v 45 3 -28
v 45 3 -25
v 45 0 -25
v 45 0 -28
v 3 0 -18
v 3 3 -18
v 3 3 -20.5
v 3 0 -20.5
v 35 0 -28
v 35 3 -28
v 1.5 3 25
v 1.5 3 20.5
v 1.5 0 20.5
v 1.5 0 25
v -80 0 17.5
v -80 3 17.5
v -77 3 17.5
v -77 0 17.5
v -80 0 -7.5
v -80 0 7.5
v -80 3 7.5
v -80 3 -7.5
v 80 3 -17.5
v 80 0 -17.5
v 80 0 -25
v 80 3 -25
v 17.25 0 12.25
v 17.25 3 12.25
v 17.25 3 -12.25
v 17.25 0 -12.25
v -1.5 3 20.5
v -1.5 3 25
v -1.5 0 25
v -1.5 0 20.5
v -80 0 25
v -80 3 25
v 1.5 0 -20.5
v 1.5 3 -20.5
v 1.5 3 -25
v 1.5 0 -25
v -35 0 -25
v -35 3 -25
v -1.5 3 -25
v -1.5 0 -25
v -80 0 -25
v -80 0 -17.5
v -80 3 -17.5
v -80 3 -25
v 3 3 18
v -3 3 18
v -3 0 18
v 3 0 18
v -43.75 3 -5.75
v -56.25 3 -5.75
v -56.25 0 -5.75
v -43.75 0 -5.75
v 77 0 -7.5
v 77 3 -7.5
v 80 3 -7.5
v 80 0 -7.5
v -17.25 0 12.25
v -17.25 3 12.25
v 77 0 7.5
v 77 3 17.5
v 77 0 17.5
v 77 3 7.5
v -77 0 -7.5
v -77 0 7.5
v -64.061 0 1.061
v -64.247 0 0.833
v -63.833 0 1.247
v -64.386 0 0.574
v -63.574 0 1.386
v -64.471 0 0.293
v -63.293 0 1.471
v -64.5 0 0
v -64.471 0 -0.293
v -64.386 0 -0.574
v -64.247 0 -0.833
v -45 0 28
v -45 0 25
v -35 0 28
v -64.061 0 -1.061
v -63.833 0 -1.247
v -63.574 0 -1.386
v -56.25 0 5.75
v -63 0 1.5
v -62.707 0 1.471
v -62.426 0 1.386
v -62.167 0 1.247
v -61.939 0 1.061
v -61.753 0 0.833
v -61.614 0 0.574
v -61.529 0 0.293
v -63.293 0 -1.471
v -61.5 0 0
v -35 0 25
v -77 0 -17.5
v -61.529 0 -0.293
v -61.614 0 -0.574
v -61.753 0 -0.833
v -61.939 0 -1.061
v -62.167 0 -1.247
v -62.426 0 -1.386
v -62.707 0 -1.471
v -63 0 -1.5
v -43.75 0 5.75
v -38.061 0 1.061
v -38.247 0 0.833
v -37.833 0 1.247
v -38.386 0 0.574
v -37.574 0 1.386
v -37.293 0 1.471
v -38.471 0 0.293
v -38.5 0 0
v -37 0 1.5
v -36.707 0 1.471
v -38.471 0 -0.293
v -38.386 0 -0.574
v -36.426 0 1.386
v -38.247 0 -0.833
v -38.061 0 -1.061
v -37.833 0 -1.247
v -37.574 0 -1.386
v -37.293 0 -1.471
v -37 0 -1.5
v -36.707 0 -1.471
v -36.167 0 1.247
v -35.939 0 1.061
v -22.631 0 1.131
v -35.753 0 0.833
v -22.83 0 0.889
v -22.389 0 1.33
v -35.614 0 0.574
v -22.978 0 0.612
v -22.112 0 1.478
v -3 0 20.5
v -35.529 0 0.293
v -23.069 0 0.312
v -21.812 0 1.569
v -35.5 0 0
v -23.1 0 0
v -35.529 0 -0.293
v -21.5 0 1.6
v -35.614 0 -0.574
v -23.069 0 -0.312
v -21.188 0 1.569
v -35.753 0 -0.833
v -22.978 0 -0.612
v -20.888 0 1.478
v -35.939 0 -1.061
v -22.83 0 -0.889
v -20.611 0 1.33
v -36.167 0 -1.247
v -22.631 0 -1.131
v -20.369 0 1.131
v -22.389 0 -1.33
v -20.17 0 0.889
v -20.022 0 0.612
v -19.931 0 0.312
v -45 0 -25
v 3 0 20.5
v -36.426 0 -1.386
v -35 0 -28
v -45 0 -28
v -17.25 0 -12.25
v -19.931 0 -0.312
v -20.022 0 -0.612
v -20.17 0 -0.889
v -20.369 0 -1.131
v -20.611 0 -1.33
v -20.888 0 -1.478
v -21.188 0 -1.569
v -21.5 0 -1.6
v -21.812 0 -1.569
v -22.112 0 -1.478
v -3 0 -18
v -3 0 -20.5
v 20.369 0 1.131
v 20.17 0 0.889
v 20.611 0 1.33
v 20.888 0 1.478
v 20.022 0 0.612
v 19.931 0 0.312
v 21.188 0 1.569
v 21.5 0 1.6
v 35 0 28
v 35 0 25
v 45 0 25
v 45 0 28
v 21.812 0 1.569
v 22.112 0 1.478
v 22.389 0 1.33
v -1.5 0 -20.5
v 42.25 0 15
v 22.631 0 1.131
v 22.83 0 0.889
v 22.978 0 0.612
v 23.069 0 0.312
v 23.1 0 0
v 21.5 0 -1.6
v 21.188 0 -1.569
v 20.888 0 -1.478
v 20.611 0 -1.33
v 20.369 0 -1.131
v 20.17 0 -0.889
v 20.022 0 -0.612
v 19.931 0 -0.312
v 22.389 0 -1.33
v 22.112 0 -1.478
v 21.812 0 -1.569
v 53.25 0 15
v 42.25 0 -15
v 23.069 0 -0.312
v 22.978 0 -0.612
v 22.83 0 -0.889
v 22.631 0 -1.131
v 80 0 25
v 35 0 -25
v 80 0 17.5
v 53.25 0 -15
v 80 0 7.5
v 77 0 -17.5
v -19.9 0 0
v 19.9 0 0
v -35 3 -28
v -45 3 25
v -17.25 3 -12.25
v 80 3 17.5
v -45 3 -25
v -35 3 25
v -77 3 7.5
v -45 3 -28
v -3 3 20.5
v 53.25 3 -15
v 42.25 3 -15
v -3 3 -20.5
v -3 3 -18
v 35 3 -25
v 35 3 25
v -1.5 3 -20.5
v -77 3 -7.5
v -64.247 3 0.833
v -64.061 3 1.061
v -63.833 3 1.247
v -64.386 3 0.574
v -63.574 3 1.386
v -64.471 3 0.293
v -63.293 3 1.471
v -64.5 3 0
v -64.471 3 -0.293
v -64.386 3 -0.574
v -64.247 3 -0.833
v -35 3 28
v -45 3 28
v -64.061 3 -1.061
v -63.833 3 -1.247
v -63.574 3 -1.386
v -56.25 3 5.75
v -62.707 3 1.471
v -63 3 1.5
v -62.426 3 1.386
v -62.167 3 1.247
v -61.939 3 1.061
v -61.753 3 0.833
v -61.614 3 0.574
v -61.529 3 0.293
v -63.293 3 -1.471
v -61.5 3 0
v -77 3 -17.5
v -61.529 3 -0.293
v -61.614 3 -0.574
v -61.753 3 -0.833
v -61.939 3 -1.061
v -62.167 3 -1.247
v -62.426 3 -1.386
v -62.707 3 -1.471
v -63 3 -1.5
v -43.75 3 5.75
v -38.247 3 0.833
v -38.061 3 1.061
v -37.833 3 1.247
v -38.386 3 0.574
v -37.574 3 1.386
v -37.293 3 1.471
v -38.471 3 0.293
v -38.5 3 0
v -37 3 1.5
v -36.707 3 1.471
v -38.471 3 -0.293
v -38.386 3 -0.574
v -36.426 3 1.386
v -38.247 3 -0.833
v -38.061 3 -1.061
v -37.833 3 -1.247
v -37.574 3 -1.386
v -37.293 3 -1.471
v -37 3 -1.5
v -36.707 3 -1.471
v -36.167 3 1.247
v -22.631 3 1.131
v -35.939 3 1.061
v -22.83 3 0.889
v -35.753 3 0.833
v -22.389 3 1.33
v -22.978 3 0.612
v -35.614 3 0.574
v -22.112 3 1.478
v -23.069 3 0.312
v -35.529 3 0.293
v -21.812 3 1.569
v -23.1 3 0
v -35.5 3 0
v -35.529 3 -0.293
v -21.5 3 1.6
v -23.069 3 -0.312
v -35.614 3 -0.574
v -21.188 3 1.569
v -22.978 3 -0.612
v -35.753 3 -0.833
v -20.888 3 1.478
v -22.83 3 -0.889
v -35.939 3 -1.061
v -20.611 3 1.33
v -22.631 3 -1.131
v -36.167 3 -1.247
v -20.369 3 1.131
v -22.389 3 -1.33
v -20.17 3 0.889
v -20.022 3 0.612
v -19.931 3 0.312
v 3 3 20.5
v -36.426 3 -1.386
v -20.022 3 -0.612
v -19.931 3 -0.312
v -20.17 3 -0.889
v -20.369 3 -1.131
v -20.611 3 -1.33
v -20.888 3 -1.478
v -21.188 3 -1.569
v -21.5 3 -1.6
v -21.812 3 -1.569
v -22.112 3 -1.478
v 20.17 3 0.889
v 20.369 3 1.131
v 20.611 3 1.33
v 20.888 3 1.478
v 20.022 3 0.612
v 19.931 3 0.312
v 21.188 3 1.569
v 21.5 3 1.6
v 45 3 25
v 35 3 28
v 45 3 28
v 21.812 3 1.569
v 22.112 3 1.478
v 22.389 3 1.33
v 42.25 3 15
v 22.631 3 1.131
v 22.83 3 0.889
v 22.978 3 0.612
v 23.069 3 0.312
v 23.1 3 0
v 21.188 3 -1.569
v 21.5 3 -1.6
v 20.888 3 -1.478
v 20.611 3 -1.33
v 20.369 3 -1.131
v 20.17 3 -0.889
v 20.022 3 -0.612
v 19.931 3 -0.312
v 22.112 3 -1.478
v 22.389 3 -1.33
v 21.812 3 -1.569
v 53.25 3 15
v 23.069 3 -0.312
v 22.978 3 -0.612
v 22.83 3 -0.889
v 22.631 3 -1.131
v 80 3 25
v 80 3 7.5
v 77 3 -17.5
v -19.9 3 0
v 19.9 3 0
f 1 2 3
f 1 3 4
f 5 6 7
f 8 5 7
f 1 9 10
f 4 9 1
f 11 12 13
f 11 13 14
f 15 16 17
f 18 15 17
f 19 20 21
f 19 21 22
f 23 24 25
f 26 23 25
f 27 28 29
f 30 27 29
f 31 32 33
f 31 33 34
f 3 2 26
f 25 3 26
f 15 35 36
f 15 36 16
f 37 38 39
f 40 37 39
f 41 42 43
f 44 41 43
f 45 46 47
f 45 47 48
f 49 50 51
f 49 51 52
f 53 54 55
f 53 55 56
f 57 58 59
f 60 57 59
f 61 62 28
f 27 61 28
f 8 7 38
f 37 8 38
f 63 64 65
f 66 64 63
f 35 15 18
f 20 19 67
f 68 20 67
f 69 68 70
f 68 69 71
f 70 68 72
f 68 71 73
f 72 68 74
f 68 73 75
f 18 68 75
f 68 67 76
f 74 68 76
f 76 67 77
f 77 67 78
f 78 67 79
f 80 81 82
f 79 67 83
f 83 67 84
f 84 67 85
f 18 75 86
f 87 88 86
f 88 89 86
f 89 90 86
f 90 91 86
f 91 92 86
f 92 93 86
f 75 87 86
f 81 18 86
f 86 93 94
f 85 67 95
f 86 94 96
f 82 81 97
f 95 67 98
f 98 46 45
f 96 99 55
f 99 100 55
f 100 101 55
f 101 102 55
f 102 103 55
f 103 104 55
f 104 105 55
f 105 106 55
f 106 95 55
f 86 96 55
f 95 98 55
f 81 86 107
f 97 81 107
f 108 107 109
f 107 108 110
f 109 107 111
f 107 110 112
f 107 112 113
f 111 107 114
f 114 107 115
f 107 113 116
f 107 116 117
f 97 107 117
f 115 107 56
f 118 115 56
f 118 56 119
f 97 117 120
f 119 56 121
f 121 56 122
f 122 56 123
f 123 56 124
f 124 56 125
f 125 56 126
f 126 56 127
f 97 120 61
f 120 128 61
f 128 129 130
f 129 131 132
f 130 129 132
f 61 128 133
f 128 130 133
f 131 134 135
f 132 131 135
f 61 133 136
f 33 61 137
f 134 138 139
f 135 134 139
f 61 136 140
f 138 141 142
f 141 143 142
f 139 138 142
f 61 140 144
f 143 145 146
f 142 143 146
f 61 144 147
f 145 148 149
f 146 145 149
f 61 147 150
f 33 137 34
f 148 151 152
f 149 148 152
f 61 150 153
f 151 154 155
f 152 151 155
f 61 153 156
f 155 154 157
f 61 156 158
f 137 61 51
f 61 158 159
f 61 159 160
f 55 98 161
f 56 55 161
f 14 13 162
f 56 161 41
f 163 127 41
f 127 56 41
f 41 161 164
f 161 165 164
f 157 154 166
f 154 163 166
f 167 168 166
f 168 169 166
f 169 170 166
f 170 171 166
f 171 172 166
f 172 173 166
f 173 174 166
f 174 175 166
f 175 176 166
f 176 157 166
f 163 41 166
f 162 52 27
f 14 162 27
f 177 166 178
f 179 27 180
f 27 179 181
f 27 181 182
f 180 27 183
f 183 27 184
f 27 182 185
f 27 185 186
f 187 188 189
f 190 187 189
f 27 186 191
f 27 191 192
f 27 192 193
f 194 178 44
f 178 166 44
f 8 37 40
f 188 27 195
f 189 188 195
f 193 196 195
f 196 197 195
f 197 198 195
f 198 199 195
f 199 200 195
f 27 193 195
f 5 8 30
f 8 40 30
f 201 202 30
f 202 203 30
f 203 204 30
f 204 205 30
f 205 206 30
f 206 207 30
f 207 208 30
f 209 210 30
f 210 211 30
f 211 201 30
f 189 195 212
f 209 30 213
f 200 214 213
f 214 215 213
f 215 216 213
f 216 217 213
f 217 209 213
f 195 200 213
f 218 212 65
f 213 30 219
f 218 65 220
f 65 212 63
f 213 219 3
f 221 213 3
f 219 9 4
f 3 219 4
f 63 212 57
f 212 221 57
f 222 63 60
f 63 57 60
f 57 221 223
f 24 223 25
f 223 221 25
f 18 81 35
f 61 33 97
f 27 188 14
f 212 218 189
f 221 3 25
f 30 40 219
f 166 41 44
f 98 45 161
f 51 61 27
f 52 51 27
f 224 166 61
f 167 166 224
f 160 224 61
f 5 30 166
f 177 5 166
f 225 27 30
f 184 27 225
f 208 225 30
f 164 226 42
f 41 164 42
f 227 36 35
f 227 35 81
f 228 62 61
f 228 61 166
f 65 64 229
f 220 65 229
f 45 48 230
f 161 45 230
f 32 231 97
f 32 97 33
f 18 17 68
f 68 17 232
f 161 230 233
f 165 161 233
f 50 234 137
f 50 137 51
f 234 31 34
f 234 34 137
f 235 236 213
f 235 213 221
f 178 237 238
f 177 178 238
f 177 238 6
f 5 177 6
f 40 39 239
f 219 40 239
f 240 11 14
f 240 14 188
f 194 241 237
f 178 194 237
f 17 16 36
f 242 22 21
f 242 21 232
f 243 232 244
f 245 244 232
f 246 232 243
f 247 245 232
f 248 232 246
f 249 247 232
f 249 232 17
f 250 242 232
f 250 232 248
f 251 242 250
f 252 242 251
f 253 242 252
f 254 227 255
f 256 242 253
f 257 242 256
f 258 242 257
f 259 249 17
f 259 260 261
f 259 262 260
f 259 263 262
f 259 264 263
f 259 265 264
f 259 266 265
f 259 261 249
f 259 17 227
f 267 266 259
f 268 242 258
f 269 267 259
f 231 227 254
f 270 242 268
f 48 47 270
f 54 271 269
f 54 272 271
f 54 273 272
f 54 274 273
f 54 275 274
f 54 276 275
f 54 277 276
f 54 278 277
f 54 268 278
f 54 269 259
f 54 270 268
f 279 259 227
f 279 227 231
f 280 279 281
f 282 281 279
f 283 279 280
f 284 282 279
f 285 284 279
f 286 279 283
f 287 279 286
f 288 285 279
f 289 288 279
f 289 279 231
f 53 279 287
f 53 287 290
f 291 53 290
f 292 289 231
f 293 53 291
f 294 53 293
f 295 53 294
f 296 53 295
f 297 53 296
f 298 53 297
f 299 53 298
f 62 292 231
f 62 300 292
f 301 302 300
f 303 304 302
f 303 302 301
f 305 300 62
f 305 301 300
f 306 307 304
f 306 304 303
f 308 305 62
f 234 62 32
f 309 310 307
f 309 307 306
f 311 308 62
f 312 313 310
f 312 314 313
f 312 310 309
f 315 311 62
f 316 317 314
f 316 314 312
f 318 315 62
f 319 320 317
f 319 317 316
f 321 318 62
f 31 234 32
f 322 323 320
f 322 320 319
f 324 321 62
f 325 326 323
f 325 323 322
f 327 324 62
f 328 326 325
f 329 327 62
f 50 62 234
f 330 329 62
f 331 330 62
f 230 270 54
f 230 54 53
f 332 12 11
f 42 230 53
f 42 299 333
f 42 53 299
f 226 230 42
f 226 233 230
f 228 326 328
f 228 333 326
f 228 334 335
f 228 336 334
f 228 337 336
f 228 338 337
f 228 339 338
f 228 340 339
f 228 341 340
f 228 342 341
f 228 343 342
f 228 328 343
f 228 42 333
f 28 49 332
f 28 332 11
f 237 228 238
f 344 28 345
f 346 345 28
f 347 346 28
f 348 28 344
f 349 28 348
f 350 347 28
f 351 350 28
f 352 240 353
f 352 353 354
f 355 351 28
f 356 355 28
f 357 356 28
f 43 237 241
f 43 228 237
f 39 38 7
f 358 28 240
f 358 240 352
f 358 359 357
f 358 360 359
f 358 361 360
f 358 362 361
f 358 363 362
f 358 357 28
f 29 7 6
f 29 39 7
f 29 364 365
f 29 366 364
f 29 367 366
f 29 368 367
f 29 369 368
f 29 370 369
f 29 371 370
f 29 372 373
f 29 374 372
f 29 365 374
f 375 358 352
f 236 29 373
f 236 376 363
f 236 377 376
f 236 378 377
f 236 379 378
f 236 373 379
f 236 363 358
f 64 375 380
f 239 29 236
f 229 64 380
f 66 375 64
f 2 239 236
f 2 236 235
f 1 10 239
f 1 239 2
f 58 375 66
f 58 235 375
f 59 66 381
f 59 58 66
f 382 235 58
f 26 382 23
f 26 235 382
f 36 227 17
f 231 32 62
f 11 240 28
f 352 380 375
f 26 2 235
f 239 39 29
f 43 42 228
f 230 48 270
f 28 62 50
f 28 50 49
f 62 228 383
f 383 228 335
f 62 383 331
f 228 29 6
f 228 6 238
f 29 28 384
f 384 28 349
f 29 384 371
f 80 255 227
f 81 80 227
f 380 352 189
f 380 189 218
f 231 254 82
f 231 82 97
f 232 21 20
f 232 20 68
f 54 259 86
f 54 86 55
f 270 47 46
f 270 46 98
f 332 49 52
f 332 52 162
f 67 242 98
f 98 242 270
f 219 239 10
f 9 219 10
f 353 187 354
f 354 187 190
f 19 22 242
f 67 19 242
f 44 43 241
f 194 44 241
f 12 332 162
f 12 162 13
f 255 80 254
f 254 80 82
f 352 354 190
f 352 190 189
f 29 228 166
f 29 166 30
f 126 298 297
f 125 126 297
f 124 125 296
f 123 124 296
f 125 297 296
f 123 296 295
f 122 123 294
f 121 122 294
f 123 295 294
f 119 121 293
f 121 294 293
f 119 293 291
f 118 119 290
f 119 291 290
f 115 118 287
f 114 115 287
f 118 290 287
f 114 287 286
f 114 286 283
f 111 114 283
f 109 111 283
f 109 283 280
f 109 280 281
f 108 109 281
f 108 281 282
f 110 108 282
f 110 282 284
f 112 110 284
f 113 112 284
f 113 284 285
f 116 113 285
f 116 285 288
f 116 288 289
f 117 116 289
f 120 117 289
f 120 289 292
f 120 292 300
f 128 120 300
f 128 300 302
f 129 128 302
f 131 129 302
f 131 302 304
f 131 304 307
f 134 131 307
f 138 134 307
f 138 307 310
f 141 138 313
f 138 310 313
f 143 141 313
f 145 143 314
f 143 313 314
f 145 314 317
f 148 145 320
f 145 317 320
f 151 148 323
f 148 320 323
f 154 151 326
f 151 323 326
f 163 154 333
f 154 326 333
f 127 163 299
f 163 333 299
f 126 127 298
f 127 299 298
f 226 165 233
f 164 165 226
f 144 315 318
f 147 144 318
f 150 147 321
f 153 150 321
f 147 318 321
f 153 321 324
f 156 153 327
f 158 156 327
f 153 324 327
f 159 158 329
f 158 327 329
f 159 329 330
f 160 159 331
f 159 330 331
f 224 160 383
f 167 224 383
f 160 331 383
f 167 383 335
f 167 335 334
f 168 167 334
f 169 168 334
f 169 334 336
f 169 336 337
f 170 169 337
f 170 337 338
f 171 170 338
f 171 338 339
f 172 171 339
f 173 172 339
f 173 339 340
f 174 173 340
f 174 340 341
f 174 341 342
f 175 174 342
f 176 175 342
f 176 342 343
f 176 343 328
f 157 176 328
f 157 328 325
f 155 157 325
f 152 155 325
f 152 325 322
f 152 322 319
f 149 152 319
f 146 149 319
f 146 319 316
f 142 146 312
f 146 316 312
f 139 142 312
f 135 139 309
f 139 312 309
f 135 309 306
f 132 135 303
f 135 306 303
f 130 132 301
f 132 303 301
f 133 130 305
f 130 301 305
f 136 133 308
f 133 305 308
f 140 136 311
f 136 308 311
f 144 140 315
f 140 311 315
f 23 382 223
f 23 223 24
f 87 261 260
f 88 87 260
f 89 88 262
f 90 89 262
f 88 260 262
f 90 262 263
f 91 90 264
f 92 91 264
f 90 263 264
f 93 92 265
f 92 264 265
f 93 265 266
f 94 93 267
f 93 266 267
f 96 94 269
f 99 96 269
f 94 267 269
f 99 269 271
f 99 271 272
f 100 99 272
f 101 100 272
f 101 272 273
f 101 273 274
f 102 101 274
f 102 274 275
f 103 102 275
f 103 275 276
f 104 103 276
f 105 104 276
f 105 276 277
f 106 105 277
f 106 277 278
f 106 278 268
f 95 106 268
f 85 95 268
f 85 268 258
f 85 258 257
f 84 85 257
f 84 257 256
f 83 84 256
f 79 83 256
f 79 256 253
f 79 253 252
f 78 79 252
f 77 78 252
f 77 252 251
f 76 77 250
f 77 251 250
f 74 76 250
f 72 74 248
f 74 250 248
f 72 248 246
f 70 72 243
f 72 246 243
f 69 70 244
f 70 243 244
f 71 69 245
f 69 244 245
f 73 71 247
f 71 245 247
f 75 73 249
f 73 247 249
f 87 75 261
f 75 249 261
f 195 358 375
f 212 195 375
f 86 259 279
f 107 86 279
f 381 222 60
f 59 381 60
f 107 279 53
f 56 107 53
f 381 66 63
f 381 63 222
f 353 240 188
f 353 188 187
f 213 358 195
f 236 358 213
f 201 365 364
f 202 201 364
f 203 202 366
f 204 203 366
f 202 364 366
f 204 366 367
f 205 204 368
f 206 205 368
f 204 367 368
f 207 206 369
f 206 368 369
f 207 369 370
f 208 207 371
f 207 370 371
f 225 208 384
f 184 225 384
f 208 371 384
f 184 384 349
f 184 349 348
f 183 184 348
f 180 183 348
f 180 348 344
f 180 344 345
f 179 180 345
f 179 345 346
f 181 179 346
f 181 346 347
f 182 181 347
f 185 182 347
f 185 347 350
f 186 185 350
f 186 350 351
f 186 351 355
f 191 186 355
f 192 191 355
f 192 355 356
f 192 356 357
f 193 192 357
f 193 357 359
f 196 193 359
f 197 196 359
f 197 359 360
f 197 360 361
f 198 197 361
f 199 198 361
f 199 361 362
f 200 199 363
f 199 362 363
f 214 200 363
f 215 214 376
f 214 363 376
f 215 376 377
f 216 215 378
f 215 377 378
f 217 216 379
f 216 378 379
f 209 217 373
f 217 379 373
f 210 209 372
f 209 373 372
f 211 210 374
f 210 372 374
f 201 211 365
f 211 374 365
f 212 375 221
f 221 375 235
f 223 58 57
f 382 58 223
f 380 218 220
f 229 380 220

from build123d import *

# Parameters (mm, degrees)
SKETCH3_W           = 160
SKETCH3_H           = 56
BOSS_EXTRUDE1_DEPTH = 3
SKETCH4_W           = 3
SKETCH4_H           = 10
SKETCH4_W_2         = 35
SKETCH4_H_2         = 3
CUT_EXTRUDE1_DEPTH  = 85.811555816
SKETCH5_R           = 1.6
SKETCH5_R_2         = 1.5
SKETCH5_W           = 34.5
SKETCH5_H           = 24.5
SKETCH5_W_2         = 11
SKETCH5_H_2         = 30
SKETCH5_W_3         = 12.5
SKETCH5_H_3         = 11.5
CUT_EXTRUDE2_DEPTH  = 85.811555816


with BuildPart() as part:
    # Sketch3 → Boss-Extrude1 (new body)
    with BuildSketch(Plane(origin=(0, 0, 0), x_dir=(1, 0, 0), z_dir=(0, 1, 0))):
        Rectangle(SKETCH3_W, SKETCH3_H)
    extrude(amount=BOSS_EXTRUDE1_DEPTH)

    # Sketch4 → Cut-Extrude1 (cut, through all)
    with BuildSketch(Plane(origin=(0, 3, 0), x_dir=(1, 0, 0), z_dir=(0, 1, 0))):
        with Locations((-78.5, 12.5)):
            Rectangle(SKETCH4_W, SKETCH4_H)
        Polygon((-35, 28), (-35, 25), (-1.5, 25), (-1.5, 20.5), (-3, 20.5), (-3, 18), (3, 18), (3, 20.5), (1.5, 20.5), (1.5, 25), (35, 25), (35, 28), align=None)
        with Locations((-62.5, 26.5)):
            Rectangle(SKETCH4_W_2, SKETCH4_H_2)
        with Locations((62.5, 26.5)):
            Rectangle(SKETCH4_W_2, SKETCH4_H_2)
        with Locations((78.5, 12.5)):
            Rectangle(SKETCH4_W, SKETCH4_H)
        with Locations((78.5, -12.5)):
            Rectangle(SKETCH4_W, SKETCH4_H)
        with Locations((62.5, -26.5)):
            Rectangle(SKETCH4_W_2, SKETCH4_H_2)
        Polygon((35, -28), (-35, -28), (-35, -25), (-1.5, -25), (-1.5, -20.5), (-3, -20.5), (-3, -18), (3, -18), (3, -20.5), (1.5, -20.5), (1.5, -25), (35, -25), align=None)
        with Locations((-62.5, -26.5)):
            Rectangle(SKETCH4_W_2, SKETCH4_H_2)
        with Locations((-78.5, -12.5)):
            Rectangle(SKETCH4_W, SKETCH4_H)
    extrude(amount=-CUT_EXTRUDE1_DEPTH, mode=Mode.SUBTRACT)

    # Sketch5 → Cut-Extrude2 (cut, through all)
    with BuildSketch(Plane(origin=(0, 3, 0), x_dir=(1, 0, 0), z_dir=(0, 1, 0))):
        with Locations(Location((-21.5, 0, 0), (0, 0, 270))):
            Circle(SKETCH5_R)
        with Locations(Location((21.5, 0, 0), (0, 0, 90))):
            Circle(SKETCH5_R)
        with Locations(Location((-63, 0, 0), (0, 0, 270))):
            Circle(SKETCH5_R_2)
        with Locations(Location((-37, 0, 0), (0, 0, 90))):
            Circle(SKETCH5_R_2)
        Rectangle(SKETCH5_W, SKETCH5_H)
        with Locations((47.75, 0)):
            Rectangle(SKETCH5_W_2, SKETCH5_H_2)
        with Locations((-50, 0)):
            Rectangle(SKETCH5_W_3, SKETCH5_H_3)
    extrude(amount=-CUT_EXTRUDE2_DEPTH, mode=Mode.SUBTRACT)


solid = part.part
